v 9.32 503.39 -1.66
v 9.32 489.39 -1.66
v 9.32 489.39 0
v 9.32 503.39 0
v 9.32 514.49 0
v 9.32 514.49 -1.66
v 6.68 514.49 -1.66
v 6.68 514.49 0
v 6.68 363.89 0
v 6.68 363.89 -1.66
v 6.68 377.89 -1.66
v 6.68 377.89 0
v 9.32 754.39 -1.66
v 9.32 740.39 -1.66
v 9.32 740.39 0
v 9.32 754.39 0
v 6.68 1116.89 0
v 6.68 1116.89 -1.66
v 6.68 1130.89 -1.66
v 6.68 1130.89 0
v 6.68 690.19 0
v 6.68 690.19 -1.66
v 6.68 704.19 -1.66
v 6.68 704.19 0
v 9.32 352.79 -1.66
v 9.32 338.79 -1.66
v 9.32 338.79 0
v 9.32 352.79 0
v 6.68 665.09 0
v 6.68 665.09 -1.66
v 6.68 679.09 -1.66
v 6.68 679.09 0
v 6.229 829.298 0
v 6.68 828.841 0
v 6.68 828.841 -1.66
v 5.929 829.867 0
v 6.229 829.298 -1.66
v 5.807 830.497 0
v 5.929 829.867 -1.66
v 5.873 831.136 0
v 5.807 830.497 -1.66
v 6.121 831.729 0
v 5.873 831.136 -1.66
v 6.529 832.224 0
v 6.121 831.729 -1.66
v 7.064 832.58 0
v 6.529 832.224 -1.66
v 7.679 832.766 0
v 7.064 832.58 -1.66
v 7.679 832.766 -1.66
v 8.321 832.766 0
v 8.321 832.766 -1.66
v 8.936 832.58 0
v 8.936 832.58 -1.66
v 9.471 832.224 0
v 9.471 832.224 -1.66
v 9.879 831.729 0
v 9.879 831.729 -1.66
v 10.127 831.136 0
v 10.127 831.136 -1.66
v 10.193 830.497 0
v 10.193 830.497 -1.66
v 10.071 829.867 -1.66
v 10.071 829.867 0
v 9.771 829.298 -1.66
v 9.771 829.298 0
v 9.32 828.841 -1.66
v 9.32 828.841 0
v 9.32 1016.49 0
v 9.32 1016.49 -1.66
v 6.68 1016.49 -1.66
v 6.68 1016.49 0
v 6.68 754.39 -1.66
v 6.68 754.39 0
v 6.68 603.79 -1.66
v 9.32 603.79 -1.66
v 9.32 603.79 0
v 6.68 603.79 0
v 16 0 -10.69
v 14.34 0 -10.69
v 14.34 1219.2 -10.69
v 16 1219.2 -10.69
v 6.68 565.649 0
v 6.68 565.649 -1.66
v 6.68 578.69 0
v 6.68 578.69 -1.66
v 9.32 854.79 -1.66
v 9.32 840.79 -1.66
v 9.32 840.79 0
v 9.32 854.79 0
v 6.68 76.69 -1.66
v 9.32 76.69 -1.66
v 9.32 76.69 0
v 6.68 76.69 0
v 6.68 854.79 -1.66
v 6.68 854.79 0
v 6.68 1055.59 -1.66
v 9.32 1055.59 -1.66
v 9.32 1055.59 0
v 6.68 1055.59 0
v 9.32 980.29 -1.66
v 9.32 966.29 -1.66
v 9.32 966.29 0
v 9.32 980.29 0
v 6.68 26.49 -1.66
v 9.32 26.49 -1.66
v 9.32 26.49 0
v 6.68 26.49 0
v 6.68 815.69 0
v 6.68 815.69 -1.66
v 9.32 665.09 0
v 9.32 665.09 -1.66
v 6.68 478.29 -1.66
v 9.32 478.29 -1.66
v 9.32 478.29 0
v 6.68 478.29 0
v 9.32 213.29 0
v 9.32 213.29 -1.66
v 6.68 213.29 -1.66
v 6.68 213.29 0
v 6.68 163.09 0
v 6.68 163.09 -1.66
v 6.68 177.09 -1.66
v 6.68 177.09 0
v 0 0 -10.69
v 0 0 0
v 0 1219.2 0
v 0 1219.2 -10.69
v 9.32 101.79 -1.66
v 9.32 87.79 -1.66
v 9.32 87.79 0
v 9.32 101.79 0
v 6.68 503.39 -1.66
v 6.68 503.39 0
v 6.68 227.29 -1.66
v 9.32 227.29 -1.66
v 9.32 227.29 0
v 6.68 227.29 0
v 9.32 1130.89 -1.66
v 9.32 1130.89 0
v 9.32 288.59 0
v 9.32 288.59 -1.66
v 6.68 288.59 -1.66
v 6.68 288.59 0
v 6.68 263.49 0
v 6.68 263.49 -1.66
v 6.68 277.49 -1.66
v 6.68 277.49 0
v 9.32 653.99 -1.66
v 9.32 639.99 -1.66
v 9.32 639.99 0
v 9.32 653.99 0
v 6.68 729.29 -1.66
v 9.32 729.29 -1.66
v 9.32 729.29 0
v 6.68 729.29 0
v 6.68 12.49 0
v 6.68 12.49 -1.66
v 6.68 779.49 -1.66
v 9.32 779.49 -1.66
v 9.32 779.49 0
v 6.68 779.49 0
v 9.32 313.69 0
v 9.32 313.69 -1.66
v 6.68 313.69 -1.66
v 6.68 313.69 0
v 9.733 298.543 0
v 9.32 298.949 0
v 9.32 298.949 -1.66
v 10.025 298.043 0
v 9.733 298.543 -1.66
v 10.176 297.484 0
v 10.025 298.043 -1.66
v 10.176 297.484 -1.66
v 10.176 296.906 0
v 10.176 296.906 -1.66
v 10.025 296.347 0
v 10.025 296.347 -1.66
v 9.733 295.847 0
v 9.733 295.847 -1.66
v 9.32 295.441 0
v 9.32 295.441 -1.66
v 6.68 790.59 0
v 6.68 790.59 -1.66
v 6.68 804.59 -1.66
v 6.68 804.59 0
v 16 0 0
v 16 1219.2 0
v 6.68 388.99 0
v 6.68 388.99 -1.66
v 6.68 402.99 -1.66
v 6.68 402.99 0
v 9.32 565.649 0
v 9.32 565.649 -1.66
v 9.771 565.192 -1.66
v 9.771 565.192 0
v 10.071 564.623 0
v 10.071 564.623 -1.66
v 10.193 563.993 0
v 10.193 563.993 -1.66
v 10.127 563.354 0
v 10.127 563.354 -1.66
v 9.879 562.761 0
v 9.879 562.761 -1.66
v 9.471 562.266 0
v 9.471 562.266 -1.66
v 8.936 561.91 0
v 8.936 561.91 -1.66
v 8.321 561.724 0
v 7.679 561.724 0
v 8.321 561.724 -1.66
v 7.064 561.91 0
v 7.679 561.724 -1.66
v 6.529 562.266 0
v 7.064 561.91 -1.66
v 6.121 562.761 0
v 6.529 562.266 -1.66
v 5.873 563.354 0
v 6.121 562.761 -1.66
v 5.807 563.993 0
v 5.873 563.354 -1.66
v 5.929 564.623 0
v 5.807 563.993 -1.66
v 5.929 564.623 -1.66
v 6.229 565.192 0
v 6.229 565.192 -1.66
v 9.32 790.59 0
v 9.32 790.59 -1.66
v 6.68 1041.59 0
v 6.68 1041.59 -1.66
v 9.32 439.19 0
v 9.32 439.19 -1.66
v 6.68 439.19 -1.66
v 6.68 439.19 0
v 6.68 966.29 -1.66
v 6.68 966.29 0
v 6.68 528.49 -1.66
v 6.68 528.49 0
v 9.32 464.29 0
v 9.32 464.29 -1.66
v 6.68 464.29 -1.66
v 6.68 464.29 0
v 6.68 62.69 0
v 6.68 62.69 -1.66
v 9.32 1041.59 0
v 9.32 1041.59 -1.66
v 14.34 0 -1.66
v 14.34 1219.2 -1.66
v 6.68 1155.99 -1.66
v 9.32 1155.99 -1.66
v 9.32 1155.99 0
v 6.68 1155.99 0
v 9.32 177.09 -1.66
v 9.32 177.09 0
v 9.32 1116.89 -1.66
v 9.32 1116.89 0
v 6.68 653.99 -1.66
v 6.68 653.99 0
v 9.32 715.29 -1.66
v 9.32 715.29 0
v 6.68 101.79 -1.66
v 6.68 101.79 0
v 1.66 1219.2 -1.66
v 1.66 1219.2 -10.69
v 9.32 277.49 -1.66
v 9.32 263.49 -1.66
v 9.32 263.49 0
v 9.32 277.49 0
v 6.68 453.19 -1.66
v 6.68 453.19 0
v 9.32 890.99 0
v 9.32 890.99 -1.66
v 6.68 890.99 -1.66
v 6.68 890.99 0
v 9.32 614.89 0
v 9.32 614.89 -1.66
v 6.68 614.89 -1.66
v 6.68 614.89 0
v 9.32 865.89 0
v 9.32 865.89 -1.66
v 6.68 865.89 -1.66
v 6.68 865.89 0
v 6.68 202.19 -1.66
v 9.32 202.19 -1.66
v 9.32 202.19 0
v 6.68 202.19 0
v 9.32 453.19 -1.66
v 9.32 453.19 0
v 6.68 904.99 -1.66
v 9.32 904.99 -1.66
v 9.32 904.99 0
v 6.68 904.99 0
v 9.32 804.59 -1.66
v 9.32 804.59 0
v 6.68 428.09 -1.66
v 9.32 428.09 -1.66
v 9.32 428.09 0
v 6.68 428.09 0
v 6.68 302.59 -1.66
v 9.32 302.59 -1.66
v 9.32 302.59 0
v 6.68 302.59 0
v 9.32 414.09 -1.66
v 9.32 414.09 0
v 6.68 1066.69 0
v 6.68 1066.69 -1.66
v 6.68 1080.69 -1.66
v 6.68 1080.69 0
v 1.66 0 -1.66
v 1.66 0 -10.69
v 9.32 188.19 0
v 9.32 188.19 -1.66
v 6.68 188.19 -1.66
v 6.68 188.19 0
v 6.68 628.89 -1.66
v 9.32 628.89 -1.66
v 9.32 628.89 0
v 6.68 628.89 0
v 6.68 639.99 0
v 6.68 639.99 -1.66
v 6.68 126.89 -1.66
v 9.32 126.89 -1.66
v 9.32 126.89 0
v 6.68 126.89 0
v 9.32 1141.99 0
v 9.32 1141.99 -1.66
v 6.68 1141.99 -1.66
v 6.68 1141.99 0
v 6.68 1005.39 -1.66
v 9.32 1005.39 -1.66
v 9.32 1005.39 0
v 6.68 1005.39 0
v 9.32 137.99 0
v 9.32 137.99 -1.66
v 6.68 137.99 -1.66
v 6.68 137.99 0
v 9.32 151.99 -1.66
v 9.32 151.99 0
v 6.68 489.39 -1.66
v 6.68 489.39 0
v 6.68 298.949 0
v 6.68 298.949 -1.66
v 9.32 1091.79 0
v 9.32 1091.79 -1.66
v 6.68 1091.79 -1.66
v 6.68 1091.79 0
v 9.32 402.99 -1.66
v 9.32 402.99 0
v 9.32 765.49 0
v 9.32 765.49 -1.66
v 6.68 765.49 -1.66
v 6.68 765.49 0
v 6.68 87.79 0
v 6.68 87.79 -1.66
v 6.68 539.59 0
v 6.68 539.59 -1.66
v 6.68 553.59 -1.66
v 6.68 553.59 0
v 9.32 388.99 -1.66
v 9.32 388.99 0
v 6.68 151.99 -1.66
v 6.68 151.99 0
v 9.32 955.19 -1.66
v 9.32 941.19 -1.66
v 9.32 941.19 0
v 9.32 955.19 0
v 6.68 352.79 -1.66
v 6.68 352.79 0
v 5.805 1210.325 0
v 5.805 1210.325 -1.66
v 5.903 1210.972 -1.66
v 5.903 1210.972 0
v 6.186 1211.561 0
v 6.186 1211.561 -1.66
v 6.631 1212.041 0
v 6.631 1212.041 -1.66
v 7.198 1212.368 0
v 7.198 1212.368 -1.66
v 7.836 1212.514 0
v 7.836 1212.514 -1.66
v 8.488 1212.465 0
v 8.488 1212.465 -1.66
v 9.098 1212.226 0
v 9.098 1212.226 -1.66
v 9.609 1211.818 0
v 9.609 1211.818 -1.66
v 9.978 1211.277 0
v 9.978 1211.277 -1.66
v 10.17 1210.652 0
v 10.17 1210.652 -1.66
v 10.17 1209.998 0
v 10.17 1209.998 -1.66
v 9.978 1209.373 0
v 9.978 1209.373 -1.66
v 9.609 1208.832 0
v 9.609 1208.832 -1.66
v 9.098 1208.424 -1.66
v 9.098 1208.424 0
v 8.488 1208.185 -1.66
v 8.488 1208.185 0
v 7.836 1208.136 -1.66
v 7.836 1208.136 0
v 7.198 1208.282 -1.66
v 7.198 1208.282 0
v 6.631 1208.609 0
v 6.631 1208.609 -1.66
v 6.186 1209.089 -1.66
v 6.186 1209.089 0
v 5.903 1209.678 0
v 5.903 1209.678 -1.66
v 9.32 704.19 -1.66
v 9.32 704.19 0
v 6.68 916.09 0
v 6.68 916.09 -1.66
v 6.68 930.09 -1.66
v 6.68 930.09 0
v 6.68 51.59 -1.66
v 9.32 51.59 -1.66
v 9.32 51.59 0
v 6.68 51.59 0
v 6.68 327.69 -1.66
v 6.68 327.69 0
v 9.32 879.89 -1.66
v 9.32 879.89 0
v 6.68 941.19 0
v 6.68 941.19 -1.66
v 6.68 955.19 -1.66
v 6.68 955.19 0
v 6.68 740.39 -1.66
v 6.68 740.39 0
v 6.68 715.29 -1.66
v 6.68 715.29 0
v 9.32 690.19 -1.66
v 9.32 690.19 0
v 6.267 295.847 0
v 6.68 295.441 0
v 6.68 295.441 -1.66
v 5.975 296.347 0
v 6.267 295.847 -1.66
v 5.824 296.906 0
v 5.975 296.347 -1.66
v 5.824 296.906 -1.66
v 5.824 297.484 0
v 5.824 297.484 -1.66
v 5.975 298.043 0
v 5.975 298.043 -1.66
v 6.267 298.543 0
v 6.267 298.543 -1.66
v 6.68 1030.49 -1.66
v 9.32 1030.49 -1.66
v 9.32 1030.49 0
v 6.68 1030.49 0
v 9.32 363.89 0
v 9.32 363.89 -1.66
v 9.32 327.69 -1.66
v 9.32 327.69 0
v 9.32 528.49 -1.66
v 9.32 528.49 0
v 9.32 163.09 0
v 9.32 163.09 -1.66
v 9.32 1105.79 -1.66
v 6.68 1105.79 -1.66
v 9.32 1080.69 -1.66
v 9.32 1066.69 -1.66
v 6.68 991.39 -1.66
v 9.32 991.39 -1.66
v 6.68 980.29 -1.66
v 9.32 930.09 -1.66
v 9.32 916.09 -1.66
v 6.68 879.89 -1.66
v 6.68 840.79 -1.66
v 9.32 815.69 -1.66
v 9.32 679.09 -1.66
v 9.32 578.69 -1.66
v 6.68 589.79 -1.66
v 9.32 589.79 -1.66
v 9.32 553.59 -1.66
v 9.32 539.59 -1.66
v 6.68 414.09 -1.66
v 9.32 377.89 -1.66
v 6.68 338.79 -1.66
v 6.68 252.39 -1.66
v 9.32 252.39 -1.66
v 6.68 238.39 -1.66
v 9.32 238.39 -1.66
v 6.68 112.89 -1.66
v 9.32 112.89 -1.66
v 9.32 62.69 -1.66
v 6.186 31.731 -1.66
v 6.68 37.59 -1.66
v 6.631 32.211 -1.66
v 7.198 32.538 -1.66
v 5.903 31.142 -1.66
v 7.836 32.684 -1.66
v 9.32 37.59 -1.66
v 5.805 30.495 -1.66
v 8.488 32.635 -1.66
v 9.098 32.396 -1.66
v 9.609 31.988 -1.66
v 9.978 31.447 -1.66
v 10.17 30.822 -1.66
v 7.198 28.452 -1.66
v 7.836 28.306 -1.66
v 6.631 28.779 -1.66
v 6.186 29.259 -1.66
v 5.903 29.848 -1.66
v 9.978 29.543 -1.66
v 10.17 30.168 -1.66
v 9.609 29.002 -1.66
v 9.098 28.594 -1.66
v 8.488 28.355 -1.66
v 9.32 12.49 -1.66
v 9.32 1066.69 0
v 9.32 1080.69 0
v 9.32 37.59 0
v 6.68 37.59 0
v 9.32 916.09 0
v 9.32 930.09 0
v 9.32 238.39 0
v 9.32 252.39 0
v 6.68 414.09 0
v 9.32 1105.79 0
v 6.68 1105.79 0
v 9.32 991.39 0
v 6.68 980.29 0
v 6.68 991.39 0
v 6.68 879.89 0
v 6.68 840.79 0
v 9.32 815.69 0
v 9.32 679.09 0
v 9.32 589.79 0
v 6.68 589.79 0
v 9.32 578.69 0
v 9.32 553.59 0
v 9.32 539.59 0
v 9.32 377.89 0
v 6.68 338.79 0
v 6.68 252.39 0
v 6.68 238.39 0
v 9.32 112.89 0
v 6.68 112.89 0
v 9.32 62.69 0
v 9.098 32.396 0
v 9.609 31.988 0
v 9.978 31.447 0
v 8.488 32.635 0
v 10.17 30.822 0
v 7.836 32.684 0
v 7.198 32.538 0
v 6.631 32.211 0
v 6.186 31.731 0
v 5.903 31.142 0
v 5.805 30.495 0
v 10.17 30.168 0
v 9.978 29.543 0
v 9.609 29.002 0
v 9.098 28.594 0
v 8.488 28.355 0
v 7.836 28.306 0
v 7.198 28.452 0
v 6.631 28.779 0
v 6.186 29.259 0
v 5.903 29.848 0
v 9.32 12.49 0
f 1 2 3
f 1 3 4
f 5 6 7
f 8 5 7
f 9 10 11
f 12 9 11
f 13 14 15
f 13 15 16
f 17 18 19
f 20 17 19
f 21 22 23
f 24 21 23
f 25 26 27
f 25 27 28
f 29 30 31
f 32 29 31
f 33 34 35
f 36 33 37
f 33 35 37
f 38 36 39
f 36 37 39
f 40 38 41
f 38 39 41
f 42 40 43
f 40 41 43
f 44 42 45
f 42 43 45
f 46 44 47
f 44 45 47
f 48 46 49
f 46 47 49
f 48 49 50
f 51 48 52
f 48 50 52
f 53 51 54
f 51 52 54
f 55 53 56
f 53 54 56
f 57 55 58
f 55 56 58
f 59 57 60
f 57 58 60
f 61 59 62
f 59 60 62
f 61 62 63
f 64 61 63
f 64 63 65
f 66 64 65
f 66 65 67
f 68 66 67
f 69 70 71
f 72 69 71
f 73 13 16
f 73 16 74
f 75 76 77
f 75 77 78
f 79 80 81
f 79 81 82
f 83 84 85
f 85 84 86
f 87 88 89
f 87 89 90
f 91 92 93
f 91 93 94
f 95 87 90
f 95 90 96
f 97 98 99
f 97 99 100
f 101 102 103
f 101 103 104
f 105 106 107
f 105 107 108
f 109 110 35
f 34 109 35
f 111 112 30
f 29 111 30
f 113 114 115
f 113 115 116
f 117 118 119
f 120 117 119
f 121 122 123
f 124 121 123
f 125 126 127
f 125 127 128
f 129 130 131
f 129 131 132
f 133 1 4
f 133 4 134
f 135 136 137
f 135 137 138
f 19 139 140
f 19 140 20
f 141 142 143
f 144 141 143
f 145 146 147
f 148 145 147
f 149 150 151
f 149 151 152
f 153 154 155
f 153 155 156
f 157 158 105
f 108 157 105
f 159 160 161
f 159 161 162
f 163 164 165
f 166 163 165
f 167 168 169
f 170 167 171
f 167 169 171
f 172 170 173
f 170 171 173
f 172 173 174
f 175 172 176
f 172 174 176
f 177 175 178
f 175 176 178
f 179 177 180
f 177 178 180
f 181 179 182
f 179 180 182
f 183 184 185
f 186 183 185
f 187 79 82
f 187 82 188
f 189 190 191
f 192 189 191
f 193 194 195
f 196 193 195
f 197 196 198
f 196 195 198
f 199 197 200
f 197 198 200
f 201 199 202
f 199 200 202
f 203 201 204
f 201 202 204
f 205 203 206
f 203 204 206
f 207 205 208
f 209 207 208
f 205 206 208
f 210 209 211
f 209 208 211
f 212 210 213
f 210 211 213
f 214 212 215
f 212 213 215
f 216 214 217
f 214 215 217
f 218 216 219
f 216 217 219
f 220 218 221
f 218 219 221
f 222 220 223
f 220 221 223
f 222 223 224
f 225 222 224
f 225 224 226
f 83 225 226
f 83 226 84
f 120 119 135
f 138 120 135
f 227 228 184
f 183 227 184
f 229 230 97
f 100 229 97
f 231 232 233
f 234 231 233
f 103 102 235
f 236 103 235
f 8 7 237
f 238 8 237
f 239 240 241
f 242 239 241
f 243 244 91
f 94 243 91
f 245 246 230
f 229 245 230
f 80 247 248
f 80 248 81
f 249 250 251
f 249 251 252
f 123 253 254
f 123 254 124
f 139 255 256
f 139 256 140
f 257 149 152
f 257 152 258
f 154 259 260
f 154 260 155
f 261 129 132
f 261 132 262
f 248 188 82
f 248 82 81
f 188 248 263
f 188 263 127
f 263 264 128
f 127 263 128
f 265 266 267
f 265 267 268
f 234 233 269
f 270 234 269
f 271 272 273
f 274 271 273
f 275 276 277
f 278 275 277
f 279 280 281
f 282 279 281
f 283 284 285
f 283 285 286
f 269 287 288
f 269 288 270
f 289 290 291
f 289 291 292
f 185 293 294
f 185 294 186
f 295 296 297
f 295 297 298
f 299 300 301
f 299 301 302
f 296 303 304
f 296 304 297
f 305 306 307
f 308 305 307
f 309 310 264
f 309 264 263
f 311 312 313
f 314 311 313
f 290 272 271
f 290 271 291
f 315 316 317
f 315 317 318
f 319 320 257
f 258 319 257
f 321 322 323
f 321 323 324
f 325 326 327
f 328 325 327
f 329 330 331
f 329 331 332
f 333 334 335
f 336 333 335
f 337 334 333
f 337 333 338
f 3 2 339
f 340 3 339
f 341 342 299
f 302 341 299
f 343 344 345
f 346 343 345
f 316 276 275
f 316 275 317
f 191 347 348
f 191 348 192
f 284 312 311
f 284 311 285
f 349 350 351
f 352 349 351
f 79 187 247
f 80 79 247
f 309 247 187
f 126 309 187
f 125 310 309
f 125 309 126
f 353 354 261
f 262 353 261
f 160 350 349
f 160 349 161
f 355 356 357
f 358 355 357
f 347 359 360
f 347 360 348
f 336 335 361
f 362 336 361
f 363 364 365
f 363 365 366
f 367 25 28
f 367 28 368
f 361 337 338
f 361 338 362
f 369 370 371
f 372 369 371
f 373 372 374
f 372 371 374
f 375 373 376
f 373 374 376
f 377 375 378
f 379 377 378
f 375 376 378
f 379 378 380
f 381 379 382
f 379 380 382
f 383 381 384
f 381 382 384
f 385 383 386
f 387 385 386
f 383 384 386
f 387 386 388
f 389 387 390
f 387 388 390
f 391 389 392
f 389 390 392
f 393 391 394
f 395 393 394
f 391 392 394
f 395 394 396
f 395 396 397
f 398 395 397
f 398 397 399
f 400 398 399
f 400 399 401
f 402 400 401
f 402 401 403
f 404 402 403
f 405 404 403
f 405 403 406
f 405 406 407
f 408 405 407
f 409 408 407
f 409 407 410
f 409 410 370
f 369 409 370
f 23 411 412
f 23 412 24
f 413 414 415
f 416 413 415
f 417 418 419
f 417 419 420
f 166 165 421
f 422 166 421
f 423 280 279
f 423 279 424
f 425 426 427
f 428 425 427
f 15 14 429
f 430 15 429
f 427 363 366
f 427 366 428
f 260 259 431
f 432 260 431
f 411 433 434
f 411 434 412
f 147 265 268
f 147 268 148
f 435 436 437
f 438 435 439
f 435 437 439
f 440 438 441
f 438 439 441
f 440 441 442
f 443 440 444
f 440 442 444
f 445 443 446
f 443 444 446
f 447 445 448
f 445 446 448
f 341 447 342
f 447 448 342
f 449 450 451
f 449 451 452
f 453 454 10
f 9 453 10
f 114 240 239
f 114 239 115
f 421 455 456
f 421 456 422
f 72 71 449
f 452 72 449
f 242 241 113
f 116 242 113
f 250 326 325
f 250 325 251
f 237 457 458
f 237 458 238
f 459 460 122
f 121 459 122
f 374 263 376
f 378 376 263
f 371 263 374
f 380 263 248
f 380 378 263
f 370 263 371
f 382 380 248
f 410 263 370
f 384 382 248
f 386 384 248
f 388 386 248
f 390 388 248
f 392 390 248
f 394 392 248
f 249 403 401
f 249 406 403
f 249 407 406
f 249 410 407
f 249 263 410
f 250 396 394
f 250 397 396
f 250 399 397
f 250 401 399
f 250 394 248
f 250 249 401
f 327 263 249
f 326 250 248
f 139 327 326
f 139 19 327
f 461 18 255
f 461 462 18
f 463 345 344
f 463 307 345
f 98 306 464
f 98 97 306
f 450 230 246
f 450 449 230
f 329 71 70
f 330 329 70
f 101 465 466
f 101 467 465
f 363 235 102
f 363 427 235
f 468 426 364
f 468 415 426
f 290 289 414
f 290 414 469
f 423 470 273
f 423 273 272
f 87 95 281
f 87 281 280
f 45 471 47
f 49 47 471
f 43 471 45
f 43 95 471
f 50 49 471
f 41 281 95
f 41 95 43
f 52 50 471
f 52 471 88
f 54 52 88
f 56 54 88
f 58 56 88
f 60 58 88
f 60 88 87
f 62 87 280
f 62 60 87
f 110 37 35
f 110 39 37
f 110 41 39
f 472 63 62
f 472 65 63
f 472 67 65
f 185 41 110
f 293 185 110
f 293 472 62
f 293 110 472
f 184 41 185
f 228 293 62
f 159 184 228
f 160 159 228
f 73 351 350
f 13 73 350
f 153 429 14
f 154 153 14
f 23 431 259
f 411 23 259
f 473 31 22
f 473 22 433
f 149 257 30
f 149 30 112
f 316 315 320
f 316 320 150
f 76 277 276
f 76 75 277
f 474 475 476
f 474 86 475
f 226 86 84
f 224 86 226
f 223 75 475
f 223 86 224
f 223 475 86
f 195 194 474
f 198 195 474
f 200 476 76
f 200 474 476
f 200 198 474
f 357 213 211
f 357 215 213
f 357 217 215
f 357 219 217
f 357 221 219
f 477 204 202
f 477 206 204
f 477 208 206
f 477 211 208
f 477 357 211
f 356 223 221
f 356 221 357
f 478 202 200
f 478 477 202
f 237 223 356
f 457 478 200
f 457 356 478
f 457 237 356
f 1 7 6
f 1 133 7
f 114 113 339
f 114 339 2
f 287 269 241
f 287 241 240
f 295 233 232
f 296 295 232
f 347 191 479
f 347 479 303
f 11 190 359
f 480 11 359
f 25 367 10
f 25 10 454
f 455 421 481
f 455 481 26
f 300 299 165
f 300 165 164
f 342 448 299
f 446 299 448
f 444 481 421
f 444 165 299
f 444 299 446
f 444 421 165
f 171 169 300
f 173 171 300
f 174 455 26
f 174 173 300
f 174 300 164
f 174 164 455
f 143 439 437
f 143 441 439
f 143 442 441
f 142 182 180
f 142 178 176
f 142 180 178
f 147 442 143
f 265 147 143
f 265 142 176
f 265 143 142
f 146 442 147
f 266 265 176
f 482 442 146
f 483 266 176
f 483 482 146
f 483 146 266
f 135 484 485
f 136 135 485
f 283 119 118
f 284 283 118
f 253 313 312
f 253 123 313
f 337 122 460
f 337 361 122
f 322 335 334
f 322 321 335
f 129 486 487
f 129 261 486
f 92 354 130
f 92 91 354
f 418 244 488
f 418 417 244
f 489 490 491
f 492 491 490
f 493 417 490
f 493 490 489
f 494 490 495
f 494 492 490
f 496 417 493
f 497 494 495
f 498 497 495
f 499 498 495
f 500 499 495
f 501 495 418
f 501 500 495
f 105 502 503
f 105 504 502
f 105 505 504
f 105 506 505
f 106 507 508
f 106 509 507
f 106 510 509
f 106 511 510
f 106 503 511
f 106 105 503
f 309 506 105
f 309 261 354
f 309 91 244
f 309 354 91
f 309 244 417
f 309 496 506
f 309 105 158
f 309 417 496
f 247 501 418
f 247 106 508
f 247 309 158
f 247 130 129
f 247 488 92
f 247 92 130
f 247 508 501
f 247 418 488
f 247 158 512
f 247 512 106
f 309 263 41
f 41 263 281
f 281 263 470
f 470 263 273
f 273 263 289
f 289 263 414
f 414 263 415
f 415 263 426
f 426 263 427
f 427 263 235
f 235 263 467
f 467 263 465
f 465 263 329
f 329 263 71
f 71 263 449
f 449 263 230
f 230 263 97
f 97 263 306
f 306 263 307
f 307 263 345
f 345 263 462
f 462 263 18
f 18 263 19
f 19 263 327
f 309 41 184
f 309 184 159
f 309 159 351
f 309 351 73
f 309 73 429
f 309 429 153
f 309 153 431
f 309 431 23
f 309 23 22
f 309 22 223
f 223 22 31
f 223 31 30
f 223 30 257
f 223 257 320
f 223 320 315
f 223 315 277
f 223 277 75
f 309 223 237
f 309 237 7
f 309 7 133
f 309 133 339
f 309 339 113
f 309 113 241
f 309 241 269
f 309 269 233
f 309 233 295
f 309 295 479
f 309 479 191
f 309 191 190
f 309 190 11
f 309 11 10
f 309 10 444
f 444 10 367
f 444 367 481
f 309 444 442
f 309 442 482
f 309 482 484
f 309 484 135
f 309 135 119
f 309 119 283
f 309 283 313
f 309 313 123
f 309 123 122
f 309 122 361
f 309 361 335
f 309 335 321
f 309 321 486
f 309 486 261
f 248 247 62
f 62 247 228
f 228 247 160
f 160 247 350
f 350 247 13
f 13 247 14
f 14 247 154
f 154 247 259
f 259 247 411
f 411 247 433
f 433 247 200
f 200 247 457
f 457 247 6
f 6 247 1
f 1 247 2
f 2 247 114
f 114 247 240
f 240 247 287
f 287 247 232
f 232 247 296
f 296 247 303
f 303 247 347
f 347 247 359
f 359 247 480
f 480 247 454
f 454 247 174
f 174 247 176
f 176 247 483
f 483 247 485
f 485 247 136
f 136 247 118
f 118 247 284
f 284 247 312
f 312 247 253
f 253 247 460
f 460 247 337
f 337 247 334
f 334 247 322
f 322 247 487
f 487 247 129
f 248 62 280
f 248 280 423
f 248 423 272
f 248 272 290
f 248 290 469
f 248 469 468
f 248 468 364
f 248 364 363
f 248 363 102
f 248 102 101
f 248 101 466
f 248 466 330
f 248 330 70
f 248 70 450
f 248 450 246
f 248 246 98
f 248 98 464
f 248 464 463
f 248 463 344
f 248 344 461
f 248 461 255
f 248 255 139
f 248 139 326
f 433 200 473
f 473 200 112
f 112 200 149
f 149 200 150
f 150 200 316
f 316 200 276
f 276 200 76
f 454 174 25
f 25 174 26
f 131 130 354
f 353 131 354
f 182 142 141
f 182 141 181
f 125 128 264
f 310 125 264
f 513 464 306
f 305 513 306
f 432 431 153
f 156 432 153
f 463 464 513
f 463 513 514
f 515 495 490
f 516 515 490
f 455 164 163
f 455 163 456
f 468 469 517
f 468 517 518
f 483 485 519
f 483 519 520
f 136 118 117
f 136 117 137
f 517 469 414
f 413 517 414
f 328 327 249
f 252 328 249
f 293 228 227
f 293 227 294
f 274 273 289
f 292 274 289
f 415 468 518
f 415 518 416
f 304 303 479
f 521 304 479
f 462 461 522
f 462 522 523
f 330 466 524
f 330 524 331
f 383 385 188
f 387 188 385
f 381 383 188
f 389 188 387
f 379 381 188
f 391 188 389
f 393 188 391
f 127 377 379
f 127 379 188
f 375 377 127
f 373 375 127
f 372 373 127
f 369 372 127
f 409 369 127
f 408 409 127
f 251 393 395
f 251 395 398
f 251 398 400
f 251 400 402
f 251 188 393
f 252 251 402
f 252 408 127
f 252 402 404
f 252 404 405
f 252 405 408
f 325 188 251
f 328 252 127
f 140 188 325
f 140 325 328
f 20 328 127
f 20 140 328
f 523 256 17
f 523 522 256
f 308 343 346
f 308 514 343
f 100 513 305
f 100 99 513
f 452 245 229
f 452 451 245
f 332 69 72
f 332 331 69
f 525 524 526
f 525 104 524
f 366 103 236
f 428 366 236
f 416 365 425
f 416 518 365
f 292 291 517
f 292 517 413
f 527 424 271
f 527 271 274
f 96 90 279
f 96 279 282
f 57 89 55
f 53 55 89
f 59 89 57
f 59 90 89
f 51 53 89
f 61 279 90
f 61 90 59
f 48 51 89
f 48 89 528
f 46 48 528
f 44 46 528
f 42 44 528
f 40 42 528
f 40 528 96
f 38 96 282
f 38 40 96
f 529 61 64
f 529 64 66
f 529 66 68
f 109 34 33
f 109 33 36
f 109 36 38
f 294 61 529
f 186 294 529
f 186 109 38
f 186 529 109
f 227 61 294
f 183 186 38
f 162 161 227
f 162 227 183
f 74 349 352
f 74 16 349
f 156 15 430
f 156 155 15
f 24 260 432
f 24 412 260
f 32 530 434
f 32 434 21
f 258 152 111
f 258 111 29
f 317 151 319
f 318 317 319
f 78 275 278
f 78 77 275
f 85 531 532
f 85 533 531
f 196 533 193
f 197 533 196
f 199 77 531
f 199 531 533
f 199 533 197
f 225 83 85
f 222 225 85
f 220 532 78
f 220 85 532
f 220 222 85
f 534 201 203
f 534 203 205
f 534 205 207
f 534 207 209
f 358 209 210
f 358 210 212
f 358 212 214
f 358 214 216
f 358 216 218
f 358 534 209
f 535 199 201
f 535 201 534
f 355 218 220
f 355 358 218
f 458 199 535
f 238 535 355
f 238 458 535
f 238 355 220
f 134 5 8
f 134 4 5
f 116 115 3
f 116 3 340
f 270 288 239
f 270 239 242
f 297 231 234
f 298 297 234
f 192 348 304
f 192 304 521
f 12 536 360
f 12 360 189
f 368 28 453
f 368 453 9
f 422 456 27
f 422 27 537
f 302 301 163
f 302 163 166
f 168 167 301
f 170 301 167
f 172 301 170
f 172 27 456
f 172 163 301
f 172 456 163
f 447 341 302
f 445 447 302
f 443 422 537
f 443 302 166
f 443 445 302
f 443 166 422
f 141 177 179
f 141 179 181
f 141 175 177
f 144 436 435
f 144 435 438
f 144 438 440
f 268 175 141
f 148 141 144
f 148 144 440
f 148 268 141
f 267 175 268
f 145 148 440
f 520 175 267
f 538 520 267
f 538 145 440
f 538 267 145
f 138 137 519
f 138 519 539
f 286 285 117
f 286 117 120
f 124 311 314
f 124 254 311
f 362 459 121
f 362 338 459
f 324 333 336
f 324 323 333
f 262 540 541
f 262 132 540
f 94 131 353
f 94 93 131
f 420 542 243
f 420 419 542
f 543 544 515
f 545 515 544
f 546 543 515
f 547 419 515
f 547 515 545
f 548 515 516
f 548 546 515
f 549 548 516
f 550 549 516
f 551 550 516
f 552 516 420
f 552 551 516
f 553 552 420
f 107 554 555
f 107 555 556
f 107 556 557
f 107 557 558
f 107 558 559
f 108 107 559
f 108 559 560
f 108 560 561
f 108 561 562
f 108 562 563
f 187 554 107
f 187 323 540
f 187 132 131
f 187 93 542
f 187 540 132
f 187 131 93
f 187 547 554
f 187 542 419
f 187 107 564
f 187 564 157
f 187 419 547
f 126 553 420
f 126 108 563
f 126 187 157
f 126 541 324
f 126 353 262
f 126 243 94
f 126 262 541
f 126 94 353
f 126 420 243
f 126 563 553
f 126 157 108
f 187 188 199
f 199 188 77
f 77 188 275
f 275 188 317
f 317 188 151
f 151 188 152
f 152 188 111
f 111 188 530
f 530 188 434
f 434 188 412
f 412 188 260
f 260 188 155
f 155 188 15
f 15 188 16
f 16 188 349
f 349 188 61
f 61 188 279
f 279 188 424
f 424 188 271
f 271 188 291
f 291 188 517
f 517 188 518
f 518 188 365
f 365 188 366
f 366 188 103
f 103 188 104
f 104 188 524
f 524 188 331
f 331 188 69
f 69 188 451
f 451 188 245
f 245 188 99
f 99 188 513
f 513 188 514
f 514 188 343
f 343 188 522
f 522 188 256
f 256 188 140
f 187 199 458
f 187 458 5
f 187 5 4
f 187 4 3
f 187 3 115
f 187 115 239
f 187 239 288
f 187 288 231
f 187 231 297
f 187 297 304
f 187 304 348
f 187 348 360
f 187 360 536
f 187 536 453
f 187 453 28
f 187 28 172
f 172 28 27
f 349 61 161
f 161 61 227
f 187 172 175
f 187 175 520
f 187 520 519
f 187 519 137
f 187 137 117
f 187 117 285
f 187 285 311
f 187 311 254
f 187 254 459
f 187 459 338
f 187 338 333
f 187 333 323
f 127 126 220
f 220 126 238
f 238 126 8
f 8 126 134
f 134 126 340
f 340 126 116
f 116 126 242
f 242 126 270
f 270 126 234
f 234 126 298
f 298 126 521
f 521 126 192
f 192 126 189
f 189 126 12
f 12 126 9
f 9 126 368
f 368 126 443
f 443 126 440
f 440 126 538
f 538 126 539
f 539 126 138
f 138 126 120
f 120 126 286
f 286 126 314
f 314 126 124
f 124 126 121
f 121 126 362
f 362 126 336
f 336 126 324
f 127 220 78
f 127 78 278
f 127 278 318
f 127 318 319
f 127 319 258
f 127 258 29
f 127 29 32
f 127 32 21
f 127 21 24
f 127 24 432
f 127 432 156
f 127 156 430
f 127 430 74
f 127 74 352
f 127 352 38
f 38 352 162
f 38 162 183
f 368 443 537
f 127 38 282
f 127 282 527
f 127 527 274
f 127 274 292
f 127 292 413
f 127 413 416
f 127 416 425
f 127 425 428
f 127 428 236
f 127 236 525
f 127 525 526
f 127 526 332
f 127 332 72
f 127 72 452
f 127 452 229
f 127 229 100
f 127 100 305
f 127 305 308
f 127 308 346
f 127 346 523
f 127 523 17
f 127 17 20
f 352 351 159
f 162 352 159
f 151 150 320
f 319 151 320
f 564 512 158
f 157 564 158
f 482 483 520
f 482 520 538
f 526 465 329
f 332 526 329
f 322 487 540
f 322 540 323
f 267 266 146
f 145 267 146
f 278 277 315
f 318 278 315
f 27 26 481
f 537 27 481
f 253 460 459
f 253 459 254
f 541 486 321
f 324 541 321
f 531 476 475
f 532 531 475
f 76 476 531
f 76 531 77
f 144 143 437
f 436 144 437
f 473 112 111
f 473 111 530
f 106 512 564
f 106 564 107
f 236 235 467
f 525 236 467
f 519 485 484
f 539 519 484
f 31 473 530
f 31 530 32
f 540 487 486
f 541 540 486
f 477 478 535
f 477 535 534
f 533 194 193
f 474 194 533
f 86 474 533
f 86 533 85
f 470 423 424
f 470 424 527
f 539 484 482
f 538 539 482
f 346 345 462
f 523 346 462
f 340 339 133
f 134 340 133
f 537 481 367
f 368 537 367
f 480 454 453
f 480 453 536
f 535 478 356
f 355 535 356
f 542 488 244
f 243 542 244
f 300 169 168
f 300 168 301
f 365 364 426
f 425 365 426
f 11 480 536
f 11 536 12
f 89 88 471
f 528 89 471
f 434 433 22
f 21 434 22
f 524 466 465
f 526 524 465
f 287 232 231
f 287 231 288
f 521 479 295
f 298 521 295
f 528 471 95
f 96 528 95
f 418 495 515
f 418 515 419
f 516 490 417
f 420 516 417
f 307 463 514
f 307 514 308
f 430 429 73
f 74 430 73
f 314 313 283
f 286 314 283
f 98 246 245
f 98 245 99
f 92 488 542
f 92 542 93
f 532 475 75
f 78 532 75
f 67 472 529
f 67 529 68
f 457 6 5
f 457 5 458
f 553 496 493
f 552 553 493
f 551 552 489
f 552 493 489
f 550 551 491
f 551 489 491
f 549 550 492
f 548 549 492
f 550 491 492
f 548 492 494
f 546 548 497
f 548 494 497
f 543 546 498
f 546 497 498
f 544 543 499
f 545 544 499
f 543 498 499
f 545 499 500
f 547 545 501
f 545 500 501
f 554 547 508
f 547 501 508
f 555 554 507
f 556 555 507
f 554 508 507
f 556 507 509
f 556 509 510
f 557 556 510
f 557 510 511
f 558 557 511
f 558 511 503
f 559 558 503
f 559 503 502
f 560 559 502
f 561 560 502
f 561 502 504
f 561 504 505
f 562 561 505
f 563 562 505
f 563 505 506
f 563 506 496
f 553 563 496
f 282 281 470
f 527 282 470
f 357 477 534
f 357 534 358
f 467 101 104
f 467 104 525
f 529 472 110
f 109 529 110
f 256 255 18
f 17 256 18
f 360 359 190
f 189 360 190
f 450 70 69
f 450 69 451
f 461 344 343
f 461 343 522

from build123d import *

# Parameters (mm, degrees)
BOSS_EXTRUDE1_DEPTH = 1219.2
SKETCH2_W           = 2.64
SKETCH2_H           = 14
CUT_EXTRUDE1_DEPTH  = 2.66
SKETCH3_R           = 2.195
CUT_EXTRUDE2_DEPTH  = 2.66


with BuildPart() as part:
    # Sketch1 → Boss-Extrude1 (new body)
    with BuildSketch(Plane(origin=(0, 0, 0), x_dir=(1, 0, 0), z_dir=(0, 1, 0))):
        Polygon((0, 0), (0, 10.69), (1.66, 10.69), (1.66, 1.66), (14.34, 1.66), (14.34, 10.69), (16, 10.69), (16, 0), align=None)
    extrude(amount=BOSS_EXTRUDE1_DEPTH)

    # Sketch2 → Cut-Extrude1 (cut, through all)
    with BuildSketch(Plane(origin=(0, 0, -1.66), x_dir=(-1, 0, 0), z_dir=(0, 0, -1))):
        with Locations((-8, 1148.99)):
            Rectangle(SKETCH2_W, SKETCH2_H)
        with Locations((-8, 1123.89)):
            Rectangle(SKETCH2_W, SKETCH2_H)
        with Locations((-8, 1098.79)):
            Rectangle(SKETCH2_W, SKETCH2_H)
        with Locations((-8, 1073.69)):
            Rectangle(SKETCH2_W, SKETCH2_H)
        with Locations((-8, 1048.59)):
            Rectangle(SKETCH2_W, SKETCH2_H)
        with Locations((-8, 1023.49)):
            Rectangle(SKETCH2_W, SKETCH2_H)
        with Locations((-8, 998.39)):
            Rectangle(SKETCH2_W, SKETCH2_H)
        with Locations((-8, 973.29)):
            Rectangle(SKETCH2_W, SKETCH2_H)
        with Locations((-8, 948.19)):
            Rectangle(SKETCH2_W, SKETCH2_H)
        with Locations((-8, 923.09)):
            Rectangle(SKETCH2_W, SKETCH2_H)
        with Locations((-8, 897.99)):
            Rectangle(SKETCH2_W, SKETCH2_H)
        with Locations((-8, 872.89)):
            Rectangle(SKETCH2_W, SKETCH2_H)
        with Locations((-8, 847.79)):
            Rectangle(SKETCH2_W, SKETCH2_H)
        with Locations((-8, 822.69)):
            Rectangle(SKETCH2_W, SKETCH2_H)
        with Locations((-8, 797.59)):
            Rectangle(SKETCH2_W, SKETCH2_H)
        with Locations((-8, 772.49)):
            Rectangle(SKETCH2_W, SKETCH2_H)
        with Locations((-8, 747.39)):
            Rectangle(SKETCH2_W, SKETCH2_H)
        with Locations((-8, 722.29)):
            Rectangle(SKETCH2_W, SKETCH2_H)
        with Locations((-8, 697.19)):
            Rectangle(SKETCH2_W, SKETCH2_H)
        with Locations((-8, 672.09)):
            Rectangle(SKETCH2_W, SKETCH2_H)
        with Locations((-8, 646.99)):
            Rectangle(SKETCH2_W, SKETCH2_H)
        with Locations((-8, 621.89)):
            Rectangle(SKETCH2_W, SKETCH2_H)
        with Locations((-8, 596.79)):
            Rectangle(SKETCH2_W, SKETCH2_H)
        with Locations((-8, 571.69)):
            Rectangle(SKETCH2_W, SKETCH2_H)
        with Locations((-8, 546.59)):
            Rectangle(SKETCH2_W, SKETCH2_H)
        with Locations((-8, 521.49)):
            Rectangle(SKETCH2_W, SKETCH2_H)
        with Locations((-8, 496.39)):
            Rectangle(SKETCH2_W, SKETCH2_H)
        with Locations((-8, 471.29)):
            Rectangle(SKETCH2_W, SKETCH2_H)
        with Locations((-8, 446.19)):
            Rectangle(SKETCH2_W, SKETCH2_H)
        with Locations((-8, 421.09)):
            Rectangle(SKETCH2_W, SKETCH2_H)
        with Locations((-8, 395.99)):
            Rectangle(SKETCH2_W, SKETCH2_H)
        with Locations((-8, 370.89)):
            Rectangle(SKETCH2_W, SKETCH2_H)
        with Locations((-8, 345.79)):
            Rectangle(SKETCH2_W, SKETCH2_H)
        with Locations((-8, 320.69)):
            Rectangle(SKETCH2_W, SKETCH2_H)
        with Locations((-8, 295.59)):
            Rectangle(SKETCH2_W, SKETCH2_H)
        with Locations((-8, 270.49)):
            Rectangle(SKETCH2_W, SKETCH2_H)
        with Locations((-8, 245.39)):
            Rectangle(SKETCH2_W, SKETCH2_H)
        with Locations((-8, 220.29)):
            Rectangle(SKETCH2_W, SKETCH2_H)
        with Locations((-8, 195.19)):
            Rectangle(SKETCH2_W, SKETCH2_H)
        with Locations((-8, 170.09)):
            Rectangle(SKETCH2_W, SKETCH2_H)
        with Locations((-8, 144.99)):
            Rectangle(SKETCH2_W, SKETCH2_H)
        with Locations((-8, 119.89)):
            Rectangle(SKETCH2_W, SKETCH2_H)
        with Locations((-8, 94.79)):
            Rectangle(SKETCH2_W, SKETCH2_H)
        with Locations((-8, 69.69)):
            Rectangle(SKETCH2_W, SKETCH2_H)
        with Locations((-8, 44.59)):
            Rectangle(SKETCH2_W, SKETCH2_H)
        with Locations((-8, 19.49)):
            Rectangle(SKETCH2_W, SKETCH2_H)
    extrude(amount=-CUT_EXTRUDE1_DEPTH, mode=Mode.SUBTRACT)

    # Sketch3 → Cut-Extrude2 (cut, through all)
    with BuildSketch(Plane(origin=(0, 0, -1.66), x_dir=(-1, 0, 0), z_dir=(0, 0, -1))):
        with Locations((-8, 1210.325)):
            Circle(SKETCH3_R)
        with Locations((-8, 830.595)):
            Circle(SKETCH3_R)
        with Locations((-8, 563.895)):
            Circle(SKETCH3_R)
        with Locations((-8, 297.195)):
            Circle(SKETCH3_R)
        with Locations((-8, 30.495)):
            Circle(SKETCH3_R)
    extrude(amount=-CUT_EXTRUDE2_DEPTH, mode=Mode.SUBTRACT)


solid = part.part
